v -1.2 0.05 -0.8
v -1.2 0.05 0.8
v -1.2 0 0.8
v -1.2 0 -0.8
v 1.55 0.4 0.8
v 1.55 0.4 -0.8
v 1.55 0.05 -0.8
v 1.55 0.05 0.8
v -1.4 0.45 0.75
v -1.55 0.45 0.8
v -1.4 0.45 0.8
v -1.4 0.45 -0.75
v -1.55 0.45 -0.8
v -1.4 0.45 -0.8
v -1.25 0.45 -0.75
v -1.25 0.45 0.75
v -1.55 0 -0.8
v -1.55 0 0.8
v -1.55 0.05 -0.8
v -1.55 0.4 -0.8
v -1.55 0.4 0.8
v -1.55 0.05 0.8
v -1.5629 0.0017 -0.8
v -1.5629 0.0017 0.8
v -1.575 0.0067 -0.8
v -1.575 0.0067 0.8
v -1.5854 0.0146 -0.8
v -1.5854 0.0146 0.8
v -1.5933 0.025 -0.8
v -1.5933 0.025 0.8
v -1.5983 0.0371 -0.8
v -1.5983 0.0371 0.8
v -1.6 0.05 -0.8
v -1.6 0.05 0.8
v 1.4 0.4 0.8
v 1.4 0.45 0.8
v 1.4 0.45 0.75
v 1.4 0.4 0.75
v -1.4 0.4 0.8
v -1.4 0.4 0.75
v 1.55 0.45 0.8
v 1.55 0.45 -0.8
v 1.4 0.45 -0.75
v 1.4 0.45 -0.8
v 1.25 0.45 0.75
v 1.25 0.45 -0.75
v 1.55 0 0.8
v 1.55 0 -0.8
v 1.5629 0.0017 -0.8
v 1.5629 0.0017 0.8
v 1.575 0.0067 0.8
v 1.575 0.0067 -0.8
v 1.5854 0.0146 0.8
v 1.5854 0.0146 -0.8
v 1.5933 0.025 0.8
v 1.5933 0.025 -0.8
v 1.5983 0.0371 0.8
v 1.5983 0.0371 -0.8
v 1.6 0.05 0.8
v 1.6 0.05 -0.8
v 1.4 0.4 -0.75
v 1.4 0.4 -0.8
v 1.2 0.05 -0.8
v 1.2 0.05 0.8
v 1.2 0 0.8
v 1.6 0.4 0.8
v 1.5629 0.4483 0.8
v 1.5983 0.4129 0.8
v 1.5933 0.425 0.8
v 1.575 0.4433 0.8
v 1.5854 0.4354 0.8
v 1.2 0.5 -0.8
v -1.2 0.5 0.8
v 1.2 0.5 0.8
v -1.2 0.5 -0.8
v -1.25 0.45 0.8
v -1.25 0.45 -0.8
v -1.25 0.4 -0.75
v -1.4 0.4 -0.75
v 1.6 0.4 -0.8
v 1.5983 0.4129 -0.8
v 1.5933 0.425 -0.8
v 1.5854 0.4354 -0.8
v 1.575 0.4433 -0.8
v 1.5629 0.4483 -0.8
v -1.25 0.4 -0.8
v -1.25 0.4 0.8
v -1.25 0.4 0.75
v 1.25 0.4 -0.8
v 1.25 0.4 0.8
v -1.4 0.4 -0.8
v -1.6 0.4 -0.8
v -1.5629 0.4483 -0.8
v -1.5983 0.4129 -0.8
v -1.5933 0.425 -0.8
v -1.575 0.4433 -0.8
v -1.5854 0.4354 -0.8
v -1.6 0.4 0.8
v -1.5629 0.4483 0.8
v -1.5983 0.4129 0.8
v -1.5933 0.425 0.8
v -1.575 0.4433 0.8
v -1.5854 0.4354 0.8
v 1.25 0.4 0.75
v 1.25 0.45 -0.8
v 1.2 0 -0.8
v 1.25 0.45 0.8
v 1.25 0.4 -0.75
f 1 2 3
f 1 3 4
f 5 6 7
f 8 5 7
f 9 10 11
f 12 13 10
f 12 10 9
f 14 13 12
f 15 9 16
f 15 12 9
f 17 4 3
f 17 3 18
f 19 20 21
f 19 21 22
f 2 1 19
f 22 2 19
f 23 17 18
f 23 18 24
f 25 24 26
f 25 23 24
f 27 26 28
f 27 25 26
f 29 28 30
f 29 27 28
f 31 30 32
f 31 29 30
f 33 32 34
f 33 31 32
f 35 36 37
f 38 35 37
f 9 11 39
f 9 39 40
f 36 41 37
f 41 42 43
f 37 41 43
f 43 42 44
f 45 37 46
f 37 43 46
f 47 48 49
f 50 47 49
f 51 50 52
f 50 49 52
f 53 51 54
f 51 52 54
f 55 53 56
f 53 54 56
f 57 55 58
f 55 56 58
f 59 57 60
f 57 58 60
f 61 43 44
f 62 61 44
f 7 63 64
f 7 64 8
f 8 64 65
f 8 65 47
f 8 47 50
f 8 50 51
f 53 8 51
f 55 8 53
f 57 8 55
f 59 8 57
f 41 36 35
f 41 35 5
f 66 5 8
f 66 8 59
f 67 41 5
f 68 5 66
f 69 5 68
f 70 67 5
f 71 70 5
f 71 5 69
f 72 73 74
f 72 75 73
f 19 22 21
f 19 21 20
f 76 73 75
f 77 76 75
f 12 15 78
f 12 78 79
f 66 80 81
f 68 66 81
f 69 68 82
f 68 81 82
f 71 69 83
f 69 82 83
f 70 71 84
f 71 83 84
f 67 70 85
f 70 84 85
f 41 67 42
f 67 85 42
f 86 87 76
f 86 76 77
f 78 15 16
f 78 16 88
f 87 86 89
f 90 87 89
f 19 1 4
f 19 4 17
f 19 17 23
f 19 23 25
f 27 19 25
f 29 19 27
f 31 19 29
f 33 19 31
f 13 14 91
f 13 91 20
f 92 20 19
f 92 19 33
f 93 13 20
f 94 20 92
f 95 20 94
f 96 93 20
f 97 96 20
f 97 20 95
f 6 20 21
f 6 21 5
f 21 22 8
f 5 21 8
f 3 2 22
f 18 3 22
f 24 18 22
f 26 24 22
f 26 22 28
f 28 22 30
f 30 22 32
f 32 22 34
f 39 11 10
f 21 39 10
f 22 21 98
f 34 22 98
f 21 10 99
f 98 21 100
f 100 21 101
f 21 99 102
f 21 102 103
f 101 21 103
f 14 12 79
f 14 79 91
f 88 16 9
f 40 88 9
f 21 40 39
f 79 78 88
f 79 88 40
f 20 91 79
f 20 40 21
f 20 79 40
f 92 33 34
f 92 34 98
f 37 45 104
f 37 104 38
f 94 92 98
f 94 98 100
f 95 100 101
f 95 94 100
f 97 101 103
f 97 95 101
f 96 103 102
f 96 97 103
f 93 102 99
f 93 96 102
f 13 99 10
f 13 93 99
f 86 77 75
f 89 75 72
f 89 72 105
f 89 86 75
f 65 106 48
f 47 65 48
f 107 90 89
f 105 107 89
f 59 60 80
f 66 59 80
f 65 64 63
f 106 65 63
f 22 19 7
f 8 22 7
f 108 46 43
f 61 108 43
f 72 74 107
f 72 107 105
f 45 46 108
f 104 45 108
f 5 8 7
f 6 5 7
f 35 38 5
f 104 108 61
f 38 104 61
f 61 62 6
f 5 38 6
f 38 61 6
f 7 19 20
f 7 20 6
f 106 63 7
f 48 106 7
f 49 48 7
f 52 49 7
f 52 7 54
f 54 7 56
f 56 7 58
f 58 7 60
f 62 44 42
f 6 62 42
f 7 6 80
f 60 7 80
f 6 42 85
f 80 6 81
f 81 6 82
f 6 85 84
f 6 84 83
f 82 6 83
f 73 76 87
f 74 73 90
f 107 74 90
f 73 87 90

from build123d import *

# Parameters (mm, degrees)
SKETCH1_W              = 3.1
SKETCH1_H              = 1.6
BOSS_EXTRUDE1_DEPTH    = 0.35
SKETCH2_W              = 0.35
SKETCH2_H              = 1.6
BASE_FLANGE1_DEPTH     = 0.05
SM_START               = -0.8
SM_EDGE_FLANGE_1_DEPTH = 1.6
SM_EDGE_FLANGE_2_DEPTH = 1.6
SKETCH14_W             = 0.15
SKETCH14_H             = 0.05
CUT_EXTRUDE1_DEPTH     = 0.05
SKETCH17_W             = 2.5
SKETCH17_H             = 1.6
BOSS_EXTRUDE3_DEPTH    = 0.1
CHAMFER1_SIZE          = 0.05


# Read off the part's stored shape, not the designer's step: Ребро-кромка1, Ребро-кромка2
# Sheet-metal steps are written as plain solids
with BuildPart() as part:
    # Sketch1 → Boss-Extrude1 (new body)
    with BuildSketch(Plane(origin=(0, 0.05, 0), x_dir=(1, 0, 0), z_dir=(0, 1, 0))):
        Rectangle(SKETCH1_W, SKETCH1_H)
    extrude(amount=BOSS_EXTRUDE1_DEPTH)


with BuildPart() as body_2:
    # Sketch2 → Base-Flange1 (new body)
    with BuildSketch(Plane(origin=(0, 0.05, 0), x_dir=(1, 0, 0), z_dir=(0, 1, 0))):
        with Locations((1.375, 0)):
            Rectangle(SKETCH2_W, SKETCH2_H)
    extrude(amount=-BASE_FLANGE1_DEPTH)

    # Ребро-кромка1 outline → Ребро-кромка1 (add)
    with BuildSketch(Plane.XY.offset(SM_START)):
        with BuildLine():
            Line((1.55, 0.4), (1.55, 0))
            ThreePointArc((1.55, 0), (1.585355339, 0.014644661), (1.6, 0.05))
            Line((1.6, 0.05), (1.6, 0.4))
            Line((1.6, 0.4), (1.55, 0.4))
        make_face()
    extrude(amount=SM_EDGE_FLANGE_1_DEPTH)

    # Ребро-кромка2 outline → Ребро-кромка2 (add)
    with BuildSketch(Plane.XY.offset(SM_START)):
        with BuildLine():
            Line((1.25, 0.4), (1.6, 0.4))
            ThreePointArc((1.6, 0.4), (1.585355339, 0.435355339), (1.55, 0.45))
            Line((1.55, 0.45), (1.25, 0.45))
            Line((1.25, 0.45), (1.25, 0.4))
        make_face()
    extrude(amount=SM_EDGE_FLANGE_2_DEPTH)

    # Sketch14 → Cut-Extrude1 (cut)
    with BuildSketch(Plane(origin=(0, 0.45, 0), x_dir=(1, 0, 0), z_dir=(0, 1, 0))):
        with Locations((1.325, -0.775)):
            Rectangle(SKETCH14_W, SKETCH14_H)
        with Locations((1.325, 0.775)):
            Rectangle(SKETCH14_W, SKETCH14_H)
    extrude(amount=-CUT_EXTRUDE1_DEPTH, mode=Mode.SUBTRACT)


with BuildPart() as body_3:
    # Mirror1: mirrored copy
    add(body_2.part.mirror(Plane(origin=(0, 0, 0), x_dir=(0, 0, 1), z_dir=(1, 0, 0))))


with BuildPart() as body_4:
    # Sketch17 → Boss-Extrude3 (new body)
    with BuildSketch(Plane(origin=(0, 0.4, 0), x_dir=(1, 0, 0), z_dir=(0, 1, 0))):
        Rectangle(SKETCH17_W, SKETCH17_H)
    extrude(amount=BOSS_EXTRUDE3_DEPTH)

    # Chamfer1
    chamfer1_edges = [body_4.edges().sort_by_distance(p)[0] for p in [
        (-1.25, 0.5, 0),
        (1.25, 0.5, 0),
    ]]
    chamfer(chamfer1_edges, length=CHAMFER1_SIZE)


solid = Compound([part.part, body_2.part, body_3.part, body_4.part])
